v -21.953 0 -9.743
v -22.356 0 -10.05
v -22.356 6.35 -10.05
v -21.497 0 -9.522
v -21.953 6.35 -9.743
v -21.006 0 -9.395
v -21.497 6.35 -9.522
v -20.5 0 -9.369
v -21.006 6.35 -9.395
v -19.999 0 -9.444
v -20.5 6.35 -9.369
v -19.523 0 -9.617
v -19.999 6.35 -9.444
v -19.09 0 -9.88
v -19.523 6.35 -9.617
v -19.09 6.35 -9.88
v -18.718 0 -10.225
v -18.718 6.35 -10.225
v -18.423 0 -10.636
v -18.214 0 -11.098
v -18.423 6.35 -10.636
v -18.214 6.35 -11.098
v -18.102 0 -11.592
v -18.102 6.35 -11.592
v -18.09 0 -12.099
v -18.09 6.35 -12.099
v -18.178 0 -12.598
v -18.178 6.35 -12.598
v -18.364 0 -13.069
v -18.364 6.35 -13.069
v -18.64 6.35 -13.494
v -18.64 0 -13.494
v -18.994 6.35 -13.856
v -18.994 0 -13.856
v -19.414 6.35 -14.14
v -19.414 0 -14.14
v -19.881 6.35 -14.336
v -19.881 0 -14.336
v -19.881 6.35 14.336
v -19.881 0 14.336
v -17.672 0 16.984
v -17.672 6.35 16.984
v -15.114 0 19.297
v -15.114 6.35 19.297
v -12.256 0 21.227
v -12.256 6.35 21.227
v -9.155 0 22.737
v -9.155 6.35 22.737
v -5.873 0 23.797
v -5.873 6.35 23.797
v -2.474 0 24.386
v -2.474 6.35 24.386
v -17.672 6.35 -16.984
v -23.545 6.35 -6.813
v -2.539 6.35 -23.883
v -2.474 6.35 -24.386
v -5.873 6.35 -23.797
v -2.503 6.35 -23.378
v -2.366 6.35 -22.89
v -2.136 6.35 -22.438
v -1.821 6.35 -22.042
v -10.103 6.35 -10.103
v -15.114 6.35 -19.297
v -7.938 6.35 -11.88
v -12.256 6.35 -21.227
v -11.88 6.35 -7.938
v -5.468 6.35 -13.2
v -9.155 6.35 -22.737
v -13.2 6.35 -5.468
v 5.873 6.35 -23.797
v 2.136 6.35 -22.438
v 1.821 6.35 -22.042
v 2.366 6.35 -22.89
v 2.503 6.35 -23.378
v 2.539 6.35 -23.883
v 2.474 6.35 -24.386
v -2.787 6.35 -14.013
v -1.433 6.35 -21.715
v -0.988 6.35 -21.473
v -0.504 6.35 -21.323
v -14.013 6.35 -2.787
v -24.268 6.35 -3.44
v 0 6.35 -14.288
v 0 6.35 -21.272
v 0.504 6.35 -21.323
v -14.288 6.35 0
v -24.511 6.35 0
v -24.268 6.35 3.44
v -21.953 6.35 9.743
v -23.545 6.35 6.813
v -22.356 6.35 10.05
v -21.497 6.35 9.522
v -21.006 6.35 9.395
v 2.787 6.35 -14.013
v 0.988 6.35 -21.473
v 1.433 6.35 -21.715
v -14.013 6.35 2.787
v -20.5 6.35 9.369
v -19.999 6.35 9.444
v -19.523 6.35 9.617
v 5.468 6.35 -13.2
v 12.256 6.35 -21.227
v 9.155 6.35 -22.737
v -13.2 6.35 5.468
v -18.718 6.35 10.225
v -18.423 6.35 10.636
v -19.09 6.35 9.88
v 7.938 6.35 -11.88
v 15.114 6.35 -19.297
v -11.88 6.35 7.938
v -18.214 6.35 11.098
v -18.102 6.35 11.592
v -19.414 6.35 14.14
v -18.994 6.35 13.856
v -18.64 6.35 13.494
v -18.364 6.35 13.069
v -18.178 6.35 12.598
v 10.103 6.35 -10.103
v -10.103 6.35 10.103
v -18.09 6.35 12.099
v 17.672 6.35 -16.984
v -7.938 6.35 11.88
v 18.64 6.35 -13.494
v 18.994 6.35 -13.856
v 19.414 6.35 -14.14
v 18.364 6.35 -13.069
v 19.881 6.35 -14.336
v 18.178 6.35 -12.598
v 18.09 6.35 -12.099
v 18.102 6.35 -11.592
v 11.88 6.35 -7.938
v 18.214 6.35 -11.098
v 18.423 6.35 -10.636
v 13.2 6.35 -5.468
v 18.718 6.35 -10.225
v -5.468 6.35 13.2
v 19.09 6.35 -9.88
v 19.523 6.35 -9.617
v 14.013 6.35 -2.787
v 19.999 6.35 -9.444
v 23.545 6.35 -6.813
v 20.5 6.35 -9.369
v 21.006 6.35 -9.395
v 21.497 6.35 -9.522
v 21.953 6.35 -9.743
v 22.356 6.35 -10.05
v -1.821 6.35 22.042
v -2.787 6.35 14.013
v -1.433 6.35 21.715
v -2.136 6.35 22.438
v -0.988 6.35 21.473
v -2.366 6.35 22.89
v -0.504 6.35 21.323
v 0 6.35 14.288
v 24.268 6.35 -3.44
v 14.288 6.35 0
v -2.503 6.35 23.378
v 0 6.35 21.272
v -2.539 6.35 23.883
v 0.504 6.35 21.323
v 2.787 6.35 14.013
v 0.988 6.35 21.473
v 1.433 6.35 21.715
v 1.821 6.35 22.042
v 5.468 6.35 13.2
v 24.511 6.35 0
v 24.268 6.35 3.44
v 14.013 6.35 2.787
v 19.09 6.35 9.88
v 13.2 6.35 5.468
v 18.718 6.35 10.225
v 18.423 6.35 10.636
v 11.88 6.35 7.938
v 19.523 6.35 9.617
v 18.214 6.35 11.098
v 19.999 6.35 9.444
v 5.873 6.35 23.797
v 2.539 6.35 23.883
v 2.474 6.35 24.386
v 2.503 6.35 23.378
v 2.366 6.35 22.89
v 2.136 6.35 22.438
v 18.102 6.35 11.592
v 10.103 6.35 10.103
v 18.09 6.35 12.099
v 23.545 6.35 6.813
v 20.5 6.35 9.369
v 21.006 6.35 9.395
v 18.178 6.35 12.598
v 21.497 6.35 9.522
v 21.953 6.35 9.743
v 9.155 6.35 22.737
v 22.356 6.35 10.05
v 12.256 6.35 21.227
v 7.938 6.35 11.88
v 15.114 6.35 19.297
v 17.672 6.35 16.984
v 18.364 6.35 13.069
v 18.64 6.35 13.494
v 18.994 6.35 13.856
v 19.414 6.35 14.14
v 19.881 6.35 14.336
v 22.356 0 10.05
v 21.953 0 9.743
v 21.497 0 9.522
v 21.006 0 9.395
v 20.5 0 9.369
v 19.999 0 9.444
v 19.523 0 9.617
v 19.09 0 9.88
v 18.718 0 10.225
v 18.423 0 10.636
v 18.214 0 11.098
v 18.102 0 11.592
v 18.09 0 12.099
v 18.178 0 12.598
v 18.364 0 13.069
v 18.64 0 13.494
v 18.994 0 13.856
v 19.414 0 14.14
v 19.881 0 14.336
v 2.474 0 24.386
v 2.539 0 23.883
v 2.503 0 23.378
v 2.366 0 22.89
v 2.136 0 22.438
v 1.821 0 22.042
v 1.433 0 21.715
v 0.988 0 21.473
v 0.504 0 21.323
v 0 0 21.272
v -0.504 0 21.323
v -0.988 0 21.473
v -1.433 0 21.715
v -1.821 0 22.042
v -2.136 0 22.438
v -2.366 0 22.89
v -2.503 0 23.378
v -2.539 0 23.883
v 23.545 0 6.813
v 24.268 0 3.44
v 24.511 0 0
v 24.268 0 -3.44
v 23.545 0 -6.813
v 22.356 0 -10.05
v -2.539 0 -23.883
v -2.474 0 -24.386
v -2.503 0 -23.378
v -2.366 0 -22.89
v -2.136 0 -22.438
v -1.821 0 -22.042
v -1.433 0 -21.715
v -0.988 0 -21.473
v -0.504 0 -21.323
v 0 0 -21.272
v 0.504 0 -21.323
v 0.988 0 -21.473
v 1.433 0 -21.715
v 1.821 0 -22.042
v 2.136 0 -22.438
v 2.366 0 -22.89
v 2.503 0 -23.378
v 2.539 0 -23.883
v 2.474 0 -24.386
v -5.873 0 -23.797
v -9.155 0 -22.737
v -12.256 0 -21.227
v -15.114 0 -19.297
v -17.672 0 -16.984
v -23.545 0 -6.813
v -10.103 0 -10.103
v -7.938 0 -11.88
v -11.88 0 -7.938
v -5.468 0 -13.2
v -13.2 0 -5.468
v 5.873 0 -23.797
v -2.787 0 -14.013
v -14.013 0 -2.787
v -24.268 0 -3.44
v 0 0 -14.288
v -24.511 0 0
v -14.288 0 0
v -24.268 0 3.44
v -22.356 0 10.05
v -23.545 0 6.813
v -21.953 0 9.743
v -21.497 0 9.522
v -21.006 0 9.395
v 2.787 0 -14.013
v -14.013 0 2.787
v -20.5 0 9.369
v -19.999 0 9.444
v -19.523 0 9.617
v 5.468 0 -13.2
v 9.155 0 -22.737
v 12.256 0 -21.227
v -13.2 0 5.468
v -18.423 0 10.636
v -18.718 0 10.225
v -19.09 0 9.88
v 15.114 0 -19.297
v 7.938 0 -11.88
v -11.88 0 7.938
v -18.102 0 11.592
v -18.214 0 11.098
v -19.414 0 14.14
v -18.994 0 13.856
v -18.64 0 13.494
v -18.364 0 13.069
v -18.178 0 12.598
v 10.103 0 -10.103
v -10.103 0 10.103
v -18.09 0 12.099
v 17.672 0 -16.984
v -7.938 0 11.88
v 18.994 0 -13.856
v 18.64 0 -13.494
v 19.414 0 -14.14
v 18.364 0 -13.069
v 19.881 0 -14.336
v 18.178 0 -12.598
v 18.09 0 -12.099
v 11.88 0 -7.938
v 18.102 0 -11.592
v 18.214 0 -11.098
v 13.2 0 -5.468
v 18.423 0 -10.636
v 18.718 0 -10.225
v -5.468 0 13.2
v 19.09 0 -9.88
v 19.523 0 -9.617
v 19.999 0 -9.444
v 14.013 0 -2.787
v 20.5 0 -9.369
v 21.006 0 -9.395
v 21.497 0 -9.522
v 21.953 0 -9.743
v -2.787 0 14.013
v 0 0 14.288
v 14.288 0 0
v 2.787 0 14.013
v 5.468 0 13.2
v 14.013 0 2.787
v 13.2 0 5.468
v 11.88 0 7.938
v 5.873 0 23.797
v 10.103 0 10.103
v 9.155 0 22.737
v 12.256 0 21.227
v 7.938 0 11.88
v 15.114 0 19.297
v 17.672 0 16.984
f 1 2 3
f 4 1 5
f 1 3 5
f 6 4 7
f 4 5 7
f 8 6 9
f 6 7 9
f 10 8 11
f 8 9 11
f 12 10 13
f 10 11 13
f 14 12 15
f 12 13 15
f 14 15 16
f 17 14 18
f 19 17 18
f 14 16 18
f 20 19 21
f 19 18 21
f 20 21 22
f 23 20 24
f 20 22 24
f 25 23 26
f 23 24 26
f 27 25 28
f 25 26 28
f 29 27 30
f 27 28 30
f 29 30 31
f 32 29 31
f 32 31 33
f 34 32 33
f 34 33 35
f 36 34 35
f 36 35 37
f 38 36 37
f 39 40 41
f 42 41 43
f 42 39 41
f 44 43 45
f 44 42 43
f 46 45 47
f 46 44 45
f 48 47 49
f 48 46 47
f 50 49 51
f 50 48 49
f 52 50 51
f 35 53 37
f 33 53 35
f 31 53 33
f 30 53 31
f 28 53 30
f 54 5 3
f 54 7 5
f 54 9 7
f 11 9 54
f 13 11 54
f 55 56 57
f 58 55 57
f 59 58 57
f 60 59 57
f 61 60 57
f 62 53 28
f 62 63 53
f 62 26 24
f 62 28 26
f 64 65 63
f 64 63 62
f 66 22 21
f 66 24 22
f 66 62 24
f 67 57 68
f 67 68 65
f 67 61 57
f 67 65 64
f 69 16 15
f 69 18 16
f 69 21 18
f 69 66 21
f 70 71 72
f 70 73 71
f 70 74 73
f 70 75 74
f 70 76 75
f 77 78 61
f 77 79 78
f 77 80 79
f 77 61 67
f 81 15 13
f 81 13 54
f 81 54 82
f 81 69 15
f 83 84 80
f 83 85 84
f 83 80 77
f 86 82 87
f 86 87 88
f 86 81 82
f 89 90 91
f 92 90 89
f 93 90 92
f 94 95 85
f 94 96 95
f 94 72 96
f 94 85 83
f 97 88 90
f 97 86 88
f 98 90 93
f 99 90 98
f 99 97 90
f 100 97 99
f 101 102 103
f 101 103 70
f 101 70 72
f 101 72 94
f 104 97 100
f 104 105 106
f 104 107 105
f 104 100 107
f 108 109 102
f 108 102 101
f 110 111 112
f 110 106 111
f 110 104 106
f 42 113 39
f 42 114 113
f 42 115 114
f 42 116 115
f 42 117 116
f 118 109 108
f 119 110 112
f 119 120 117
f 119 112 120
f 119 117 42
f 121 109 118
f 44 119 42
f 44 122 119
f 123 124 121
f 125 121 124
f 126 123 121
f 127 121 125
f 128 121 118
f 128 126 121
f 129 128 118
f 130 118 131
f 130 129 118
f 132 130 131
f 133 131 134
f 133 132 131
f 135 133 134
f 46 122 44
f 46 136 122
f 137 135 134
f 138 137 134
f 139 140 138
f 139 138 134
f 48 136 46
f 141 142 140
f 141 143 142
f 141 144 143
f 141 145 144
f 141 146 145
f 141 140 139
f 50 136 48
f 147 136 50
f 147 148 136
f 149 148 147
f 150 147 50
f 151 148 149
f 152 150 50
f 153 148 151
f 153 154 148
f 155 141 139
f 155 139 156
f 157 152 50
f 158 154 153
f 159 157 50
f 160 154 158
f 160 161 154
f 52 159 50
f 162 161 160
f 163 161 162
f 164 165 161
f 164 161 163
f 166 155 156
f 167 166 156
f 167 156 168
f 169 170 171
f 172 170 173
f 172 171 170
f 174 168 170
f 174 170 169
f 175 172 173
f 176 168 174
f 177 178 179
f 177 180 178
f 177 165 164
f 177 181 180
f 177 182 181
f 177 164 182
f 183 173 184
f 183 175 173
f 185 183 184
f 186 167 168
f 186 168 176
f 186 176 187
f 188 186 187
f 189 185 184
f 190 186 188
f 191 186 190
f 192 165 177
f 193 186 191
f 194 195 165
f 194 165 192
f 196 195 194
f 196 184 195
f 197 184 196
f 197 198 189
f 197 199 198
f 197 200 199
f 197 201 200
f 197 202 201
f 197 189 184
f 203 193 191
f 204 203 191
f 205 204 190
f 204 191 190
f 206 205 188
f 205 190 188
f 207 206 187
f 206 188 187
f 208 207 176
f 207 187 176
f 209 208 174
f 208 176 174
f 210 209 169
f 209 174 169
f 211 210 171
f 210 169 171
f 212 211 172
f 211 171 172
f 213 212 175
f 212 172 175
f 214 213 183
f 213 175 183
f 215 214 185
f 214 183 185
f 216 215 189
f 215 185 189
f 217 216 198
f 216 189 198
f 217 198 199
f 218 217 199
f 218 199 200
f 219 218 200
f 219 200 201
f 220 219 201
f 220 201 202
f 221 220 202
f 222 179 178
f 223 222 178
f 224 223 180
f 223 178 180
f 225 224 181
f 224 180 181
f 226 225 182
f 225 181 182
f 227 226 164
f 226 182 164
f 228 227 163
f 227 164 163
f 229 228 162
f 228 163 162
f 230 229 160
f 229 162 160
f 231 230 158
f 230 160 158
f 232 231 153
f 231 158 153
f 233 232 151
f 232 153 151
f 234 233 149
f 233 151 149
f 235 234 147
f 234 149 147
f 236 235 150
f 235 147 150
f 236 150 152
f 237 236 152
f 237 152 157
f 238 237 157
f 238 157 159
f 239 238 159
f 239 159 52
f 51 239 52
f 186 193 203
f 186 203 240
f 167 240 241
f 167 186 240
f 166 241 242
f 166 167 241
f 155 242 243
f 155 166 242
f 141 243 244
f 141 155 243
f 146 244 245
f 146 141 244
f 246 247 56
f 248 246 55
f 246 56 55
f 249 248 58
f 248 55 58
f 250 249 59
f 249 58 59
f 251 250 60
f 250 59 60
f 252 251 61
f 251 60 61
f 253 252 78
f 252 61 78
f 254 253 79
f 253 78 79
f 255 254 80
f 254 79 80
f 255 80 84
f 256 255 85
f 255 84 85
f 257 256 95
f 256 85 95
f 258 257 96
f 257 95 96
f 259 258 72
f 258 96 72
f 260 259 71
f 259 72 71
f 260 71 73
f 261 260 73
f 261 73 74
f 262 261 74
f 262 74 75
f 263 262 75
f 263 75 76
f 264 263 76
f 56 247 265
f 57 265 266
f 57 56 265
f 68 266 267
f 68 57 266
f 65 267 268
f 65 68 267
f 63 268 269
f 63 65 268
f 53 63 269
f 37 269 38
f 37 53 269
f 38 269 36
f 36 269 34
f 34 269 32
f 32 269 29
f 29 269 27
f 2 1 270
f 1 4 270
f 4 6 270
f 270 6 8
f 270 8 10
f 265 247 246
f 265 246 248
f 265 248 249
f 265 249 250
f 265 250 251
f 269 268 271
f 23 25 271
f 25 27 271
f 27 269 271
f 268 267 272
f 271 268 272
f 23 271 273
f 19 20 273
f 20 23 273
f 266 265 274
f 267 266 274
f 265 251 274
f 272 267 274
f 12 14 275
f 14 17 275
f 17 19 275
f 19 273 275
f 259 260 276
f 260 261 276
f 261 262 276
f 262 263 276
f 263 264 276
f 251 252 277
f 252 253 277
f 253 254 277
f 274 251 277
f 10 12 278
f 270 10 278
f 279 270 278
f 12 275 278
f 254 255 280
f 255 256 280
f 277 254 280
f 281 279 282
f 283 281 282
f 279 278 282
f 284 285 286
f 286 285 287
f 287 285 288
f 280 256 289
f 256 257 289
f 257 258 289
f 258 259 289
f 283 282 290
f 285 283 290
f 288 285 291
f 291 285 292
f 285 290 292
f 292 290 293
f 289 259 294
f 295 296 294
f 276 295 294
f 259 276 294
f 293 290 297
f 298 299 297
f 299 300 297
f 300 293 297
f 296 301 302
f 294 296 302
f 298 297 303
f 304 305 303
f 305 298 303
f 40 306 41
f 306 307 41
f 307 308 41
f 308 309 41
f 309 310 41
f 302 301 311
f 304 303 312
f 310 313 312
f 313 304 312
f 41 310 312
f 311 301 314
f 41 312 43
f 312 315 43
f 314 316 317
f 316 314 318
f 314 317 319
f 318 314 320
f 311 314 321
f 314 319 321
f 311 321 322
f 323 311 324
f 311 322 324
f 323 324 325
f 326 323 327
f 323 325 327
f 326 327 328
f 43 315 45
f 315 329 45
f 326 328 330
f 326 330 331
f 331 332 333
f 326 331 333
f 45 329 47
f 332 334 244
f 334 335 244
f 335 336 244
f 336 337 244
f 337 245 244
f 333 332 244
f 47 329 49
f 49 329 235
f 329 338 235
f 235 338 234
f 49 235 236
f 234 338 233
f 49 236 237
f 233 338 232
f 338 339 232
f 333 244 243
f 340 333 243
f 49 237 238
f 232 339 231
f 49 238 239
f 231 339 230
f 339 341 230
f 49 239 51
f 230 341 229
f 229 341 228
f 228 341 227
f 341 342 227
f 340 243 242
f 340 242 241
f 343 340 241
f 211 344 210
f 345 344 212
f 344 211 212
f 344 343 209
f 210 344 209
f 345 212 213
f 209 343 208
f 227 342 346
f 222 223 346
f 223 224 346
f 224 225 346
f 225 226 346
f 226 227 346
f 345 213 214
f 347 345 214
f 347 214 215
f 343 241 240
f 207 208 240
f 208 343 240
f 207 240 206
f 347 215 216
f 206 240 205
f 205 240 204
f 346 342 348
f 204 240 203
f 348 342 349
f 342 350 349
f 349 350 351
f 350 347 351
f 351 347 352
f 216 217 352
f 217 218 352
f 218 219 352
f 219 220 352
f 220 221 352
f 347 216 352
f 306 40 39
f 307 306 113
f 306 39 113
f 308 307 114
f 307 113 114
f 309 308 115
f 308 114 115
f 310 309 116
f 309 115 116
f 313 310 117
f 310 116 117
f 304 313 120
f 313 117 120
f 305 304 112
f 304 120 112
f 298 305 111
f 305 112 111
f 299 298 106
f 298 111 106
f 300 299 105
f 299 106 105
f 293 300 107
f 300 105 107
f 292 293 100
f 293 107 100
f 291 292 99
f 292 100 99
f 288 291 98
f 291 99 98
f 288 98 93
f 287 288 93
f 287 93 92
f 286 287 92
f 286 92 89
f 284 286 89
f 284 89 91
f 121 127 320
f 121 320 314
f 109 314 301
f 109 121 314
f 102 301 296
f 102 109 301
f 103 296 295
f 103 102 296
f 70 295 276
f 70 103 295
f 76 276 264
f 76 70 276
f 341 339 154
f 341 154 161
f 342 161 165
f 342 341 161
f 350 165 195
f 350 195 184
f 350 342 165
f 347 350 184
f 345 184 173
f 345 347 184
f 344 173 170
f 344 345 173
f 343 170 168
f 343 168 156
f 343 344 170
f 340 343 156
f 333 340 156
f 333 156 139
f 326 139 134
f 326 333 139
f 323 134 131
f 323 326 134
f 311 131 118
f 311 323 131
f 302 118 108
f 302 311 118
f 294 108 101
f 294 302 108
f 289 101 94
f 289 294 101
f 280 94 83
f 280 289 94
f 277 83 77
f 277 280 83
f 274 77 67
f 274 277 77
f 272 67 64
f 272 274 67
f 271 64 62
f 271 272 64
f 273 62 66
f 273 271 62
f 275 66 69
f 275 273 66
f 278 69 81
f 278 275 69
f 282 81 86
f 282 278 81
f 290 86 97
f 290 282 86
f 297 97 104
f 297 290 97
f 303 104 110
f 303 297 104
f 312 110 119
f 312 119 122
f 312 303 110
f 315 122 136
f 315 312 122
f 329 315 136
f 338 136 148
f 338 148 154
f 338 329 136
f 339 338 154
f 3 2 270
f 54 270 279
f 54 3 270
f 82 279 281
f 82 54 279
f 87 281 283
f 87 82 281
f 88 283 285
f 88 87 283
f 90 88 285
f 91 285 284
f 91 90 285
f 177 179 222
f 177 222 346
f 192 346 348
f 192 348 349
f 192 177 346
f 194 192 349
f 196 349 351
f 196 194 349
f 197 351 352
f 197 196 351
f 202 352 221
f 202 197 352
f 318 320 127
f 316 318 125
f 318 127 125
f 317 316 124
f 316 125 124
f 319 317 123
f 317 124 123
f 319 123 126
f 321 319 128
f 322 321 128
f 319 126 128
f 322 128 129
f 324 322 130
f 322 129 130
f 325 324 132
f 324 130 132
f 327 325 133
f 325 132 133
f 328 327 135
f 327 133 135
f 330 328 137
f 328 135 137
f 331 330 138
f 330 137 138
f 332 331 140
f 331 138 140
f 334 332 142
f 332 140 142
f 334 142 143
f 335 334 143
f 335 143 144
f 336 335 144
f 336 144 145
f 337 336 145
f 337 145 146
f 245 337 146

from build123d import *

# Parameters (mm, degrees)
SKETCH1_R           = 30.861
SKETCH1_R_2         = 14.2875
BOSS_EXTRUDE1_DEPTH = 6.35
SKETCH2_R           = 2.54
CUT_EXTRUDE1_DEPTH  = 6.35
SKETCH3_R           = 30.861
SKETCH3_R_2         = 24.511
CUT_EXTRUDE2_DEPTH  = 45.103572894


with BuildPart() as part:
    # Sketch1 → Boss-Extrude1 (new body)
    with BuildSketch(Plane(origin=(0, 0, 0), x_dir=(1, 0, 0), z_dir=(0, 1, 0))):
        with Locations(Location((0, 0, 0), (0, 0, 270))):
            Circle(SKETCH1_R)
        with Locations(Location((0, 0, 0), (0, 0, 270))):
            Circle(SKETCH1_R_2, mode=Mode.SUBTRACT)
    extrude(amount=BOSS_EXTRUDE1_DEPTH)

    # Sketch2 → Cut-Extrude1 (cut)
    with BuildSketch(Plane(origin=(0, 6.35, 0), x_dir=(1, 0, 0), z_dir=(0, 1, 0))):
        with Locations(Location((0, 23.8125, 0), (0, 0, 270))):
            Circle(SKETCH2_R)
        with Locations(Location((0, -23.8125, 0), (0, 0, 270))):
            Circle(SKETCH2_R)
        with Locations(Location((20.622229928, 11.90625, 0), (0, 0, 270))):
            Circle(SKETCH2_R)
        with Locations(Location((20.622229928, -11.90625, 0), (0, 0, 270))):
            Circle(SKETCH2_R)
        with Locations(Location((-20.622229928, 11.90625, 0), (0, 0, 270))):
            Circle(SKETCH2_R)
        with Locations(Location((-20.622229928, -11.90625, 0), (0, 0, 270))):
            Circle(SKETCH2_R)
    extrude(amount=-CUT_EXTRUDE1_DEPTH, mode=Mode.SUBTRACT)

    # Sketch3 → Cut-Extrude2 (cut, through all)
    with BuildSketch(Plane(origin=(0, 6.35, 0), x_dir=(1, 0, 0), z_dir=(0, 1, 0))):
        Circle(SKETCH3_R)
        Circle(SKETCH3_R_2, mode=Mode.SUBTRACT)
    extrude(amount=-CUT_EXTRUDE2_DEPTH, mode=Mode.SUBTRACT)


solid = part.part
